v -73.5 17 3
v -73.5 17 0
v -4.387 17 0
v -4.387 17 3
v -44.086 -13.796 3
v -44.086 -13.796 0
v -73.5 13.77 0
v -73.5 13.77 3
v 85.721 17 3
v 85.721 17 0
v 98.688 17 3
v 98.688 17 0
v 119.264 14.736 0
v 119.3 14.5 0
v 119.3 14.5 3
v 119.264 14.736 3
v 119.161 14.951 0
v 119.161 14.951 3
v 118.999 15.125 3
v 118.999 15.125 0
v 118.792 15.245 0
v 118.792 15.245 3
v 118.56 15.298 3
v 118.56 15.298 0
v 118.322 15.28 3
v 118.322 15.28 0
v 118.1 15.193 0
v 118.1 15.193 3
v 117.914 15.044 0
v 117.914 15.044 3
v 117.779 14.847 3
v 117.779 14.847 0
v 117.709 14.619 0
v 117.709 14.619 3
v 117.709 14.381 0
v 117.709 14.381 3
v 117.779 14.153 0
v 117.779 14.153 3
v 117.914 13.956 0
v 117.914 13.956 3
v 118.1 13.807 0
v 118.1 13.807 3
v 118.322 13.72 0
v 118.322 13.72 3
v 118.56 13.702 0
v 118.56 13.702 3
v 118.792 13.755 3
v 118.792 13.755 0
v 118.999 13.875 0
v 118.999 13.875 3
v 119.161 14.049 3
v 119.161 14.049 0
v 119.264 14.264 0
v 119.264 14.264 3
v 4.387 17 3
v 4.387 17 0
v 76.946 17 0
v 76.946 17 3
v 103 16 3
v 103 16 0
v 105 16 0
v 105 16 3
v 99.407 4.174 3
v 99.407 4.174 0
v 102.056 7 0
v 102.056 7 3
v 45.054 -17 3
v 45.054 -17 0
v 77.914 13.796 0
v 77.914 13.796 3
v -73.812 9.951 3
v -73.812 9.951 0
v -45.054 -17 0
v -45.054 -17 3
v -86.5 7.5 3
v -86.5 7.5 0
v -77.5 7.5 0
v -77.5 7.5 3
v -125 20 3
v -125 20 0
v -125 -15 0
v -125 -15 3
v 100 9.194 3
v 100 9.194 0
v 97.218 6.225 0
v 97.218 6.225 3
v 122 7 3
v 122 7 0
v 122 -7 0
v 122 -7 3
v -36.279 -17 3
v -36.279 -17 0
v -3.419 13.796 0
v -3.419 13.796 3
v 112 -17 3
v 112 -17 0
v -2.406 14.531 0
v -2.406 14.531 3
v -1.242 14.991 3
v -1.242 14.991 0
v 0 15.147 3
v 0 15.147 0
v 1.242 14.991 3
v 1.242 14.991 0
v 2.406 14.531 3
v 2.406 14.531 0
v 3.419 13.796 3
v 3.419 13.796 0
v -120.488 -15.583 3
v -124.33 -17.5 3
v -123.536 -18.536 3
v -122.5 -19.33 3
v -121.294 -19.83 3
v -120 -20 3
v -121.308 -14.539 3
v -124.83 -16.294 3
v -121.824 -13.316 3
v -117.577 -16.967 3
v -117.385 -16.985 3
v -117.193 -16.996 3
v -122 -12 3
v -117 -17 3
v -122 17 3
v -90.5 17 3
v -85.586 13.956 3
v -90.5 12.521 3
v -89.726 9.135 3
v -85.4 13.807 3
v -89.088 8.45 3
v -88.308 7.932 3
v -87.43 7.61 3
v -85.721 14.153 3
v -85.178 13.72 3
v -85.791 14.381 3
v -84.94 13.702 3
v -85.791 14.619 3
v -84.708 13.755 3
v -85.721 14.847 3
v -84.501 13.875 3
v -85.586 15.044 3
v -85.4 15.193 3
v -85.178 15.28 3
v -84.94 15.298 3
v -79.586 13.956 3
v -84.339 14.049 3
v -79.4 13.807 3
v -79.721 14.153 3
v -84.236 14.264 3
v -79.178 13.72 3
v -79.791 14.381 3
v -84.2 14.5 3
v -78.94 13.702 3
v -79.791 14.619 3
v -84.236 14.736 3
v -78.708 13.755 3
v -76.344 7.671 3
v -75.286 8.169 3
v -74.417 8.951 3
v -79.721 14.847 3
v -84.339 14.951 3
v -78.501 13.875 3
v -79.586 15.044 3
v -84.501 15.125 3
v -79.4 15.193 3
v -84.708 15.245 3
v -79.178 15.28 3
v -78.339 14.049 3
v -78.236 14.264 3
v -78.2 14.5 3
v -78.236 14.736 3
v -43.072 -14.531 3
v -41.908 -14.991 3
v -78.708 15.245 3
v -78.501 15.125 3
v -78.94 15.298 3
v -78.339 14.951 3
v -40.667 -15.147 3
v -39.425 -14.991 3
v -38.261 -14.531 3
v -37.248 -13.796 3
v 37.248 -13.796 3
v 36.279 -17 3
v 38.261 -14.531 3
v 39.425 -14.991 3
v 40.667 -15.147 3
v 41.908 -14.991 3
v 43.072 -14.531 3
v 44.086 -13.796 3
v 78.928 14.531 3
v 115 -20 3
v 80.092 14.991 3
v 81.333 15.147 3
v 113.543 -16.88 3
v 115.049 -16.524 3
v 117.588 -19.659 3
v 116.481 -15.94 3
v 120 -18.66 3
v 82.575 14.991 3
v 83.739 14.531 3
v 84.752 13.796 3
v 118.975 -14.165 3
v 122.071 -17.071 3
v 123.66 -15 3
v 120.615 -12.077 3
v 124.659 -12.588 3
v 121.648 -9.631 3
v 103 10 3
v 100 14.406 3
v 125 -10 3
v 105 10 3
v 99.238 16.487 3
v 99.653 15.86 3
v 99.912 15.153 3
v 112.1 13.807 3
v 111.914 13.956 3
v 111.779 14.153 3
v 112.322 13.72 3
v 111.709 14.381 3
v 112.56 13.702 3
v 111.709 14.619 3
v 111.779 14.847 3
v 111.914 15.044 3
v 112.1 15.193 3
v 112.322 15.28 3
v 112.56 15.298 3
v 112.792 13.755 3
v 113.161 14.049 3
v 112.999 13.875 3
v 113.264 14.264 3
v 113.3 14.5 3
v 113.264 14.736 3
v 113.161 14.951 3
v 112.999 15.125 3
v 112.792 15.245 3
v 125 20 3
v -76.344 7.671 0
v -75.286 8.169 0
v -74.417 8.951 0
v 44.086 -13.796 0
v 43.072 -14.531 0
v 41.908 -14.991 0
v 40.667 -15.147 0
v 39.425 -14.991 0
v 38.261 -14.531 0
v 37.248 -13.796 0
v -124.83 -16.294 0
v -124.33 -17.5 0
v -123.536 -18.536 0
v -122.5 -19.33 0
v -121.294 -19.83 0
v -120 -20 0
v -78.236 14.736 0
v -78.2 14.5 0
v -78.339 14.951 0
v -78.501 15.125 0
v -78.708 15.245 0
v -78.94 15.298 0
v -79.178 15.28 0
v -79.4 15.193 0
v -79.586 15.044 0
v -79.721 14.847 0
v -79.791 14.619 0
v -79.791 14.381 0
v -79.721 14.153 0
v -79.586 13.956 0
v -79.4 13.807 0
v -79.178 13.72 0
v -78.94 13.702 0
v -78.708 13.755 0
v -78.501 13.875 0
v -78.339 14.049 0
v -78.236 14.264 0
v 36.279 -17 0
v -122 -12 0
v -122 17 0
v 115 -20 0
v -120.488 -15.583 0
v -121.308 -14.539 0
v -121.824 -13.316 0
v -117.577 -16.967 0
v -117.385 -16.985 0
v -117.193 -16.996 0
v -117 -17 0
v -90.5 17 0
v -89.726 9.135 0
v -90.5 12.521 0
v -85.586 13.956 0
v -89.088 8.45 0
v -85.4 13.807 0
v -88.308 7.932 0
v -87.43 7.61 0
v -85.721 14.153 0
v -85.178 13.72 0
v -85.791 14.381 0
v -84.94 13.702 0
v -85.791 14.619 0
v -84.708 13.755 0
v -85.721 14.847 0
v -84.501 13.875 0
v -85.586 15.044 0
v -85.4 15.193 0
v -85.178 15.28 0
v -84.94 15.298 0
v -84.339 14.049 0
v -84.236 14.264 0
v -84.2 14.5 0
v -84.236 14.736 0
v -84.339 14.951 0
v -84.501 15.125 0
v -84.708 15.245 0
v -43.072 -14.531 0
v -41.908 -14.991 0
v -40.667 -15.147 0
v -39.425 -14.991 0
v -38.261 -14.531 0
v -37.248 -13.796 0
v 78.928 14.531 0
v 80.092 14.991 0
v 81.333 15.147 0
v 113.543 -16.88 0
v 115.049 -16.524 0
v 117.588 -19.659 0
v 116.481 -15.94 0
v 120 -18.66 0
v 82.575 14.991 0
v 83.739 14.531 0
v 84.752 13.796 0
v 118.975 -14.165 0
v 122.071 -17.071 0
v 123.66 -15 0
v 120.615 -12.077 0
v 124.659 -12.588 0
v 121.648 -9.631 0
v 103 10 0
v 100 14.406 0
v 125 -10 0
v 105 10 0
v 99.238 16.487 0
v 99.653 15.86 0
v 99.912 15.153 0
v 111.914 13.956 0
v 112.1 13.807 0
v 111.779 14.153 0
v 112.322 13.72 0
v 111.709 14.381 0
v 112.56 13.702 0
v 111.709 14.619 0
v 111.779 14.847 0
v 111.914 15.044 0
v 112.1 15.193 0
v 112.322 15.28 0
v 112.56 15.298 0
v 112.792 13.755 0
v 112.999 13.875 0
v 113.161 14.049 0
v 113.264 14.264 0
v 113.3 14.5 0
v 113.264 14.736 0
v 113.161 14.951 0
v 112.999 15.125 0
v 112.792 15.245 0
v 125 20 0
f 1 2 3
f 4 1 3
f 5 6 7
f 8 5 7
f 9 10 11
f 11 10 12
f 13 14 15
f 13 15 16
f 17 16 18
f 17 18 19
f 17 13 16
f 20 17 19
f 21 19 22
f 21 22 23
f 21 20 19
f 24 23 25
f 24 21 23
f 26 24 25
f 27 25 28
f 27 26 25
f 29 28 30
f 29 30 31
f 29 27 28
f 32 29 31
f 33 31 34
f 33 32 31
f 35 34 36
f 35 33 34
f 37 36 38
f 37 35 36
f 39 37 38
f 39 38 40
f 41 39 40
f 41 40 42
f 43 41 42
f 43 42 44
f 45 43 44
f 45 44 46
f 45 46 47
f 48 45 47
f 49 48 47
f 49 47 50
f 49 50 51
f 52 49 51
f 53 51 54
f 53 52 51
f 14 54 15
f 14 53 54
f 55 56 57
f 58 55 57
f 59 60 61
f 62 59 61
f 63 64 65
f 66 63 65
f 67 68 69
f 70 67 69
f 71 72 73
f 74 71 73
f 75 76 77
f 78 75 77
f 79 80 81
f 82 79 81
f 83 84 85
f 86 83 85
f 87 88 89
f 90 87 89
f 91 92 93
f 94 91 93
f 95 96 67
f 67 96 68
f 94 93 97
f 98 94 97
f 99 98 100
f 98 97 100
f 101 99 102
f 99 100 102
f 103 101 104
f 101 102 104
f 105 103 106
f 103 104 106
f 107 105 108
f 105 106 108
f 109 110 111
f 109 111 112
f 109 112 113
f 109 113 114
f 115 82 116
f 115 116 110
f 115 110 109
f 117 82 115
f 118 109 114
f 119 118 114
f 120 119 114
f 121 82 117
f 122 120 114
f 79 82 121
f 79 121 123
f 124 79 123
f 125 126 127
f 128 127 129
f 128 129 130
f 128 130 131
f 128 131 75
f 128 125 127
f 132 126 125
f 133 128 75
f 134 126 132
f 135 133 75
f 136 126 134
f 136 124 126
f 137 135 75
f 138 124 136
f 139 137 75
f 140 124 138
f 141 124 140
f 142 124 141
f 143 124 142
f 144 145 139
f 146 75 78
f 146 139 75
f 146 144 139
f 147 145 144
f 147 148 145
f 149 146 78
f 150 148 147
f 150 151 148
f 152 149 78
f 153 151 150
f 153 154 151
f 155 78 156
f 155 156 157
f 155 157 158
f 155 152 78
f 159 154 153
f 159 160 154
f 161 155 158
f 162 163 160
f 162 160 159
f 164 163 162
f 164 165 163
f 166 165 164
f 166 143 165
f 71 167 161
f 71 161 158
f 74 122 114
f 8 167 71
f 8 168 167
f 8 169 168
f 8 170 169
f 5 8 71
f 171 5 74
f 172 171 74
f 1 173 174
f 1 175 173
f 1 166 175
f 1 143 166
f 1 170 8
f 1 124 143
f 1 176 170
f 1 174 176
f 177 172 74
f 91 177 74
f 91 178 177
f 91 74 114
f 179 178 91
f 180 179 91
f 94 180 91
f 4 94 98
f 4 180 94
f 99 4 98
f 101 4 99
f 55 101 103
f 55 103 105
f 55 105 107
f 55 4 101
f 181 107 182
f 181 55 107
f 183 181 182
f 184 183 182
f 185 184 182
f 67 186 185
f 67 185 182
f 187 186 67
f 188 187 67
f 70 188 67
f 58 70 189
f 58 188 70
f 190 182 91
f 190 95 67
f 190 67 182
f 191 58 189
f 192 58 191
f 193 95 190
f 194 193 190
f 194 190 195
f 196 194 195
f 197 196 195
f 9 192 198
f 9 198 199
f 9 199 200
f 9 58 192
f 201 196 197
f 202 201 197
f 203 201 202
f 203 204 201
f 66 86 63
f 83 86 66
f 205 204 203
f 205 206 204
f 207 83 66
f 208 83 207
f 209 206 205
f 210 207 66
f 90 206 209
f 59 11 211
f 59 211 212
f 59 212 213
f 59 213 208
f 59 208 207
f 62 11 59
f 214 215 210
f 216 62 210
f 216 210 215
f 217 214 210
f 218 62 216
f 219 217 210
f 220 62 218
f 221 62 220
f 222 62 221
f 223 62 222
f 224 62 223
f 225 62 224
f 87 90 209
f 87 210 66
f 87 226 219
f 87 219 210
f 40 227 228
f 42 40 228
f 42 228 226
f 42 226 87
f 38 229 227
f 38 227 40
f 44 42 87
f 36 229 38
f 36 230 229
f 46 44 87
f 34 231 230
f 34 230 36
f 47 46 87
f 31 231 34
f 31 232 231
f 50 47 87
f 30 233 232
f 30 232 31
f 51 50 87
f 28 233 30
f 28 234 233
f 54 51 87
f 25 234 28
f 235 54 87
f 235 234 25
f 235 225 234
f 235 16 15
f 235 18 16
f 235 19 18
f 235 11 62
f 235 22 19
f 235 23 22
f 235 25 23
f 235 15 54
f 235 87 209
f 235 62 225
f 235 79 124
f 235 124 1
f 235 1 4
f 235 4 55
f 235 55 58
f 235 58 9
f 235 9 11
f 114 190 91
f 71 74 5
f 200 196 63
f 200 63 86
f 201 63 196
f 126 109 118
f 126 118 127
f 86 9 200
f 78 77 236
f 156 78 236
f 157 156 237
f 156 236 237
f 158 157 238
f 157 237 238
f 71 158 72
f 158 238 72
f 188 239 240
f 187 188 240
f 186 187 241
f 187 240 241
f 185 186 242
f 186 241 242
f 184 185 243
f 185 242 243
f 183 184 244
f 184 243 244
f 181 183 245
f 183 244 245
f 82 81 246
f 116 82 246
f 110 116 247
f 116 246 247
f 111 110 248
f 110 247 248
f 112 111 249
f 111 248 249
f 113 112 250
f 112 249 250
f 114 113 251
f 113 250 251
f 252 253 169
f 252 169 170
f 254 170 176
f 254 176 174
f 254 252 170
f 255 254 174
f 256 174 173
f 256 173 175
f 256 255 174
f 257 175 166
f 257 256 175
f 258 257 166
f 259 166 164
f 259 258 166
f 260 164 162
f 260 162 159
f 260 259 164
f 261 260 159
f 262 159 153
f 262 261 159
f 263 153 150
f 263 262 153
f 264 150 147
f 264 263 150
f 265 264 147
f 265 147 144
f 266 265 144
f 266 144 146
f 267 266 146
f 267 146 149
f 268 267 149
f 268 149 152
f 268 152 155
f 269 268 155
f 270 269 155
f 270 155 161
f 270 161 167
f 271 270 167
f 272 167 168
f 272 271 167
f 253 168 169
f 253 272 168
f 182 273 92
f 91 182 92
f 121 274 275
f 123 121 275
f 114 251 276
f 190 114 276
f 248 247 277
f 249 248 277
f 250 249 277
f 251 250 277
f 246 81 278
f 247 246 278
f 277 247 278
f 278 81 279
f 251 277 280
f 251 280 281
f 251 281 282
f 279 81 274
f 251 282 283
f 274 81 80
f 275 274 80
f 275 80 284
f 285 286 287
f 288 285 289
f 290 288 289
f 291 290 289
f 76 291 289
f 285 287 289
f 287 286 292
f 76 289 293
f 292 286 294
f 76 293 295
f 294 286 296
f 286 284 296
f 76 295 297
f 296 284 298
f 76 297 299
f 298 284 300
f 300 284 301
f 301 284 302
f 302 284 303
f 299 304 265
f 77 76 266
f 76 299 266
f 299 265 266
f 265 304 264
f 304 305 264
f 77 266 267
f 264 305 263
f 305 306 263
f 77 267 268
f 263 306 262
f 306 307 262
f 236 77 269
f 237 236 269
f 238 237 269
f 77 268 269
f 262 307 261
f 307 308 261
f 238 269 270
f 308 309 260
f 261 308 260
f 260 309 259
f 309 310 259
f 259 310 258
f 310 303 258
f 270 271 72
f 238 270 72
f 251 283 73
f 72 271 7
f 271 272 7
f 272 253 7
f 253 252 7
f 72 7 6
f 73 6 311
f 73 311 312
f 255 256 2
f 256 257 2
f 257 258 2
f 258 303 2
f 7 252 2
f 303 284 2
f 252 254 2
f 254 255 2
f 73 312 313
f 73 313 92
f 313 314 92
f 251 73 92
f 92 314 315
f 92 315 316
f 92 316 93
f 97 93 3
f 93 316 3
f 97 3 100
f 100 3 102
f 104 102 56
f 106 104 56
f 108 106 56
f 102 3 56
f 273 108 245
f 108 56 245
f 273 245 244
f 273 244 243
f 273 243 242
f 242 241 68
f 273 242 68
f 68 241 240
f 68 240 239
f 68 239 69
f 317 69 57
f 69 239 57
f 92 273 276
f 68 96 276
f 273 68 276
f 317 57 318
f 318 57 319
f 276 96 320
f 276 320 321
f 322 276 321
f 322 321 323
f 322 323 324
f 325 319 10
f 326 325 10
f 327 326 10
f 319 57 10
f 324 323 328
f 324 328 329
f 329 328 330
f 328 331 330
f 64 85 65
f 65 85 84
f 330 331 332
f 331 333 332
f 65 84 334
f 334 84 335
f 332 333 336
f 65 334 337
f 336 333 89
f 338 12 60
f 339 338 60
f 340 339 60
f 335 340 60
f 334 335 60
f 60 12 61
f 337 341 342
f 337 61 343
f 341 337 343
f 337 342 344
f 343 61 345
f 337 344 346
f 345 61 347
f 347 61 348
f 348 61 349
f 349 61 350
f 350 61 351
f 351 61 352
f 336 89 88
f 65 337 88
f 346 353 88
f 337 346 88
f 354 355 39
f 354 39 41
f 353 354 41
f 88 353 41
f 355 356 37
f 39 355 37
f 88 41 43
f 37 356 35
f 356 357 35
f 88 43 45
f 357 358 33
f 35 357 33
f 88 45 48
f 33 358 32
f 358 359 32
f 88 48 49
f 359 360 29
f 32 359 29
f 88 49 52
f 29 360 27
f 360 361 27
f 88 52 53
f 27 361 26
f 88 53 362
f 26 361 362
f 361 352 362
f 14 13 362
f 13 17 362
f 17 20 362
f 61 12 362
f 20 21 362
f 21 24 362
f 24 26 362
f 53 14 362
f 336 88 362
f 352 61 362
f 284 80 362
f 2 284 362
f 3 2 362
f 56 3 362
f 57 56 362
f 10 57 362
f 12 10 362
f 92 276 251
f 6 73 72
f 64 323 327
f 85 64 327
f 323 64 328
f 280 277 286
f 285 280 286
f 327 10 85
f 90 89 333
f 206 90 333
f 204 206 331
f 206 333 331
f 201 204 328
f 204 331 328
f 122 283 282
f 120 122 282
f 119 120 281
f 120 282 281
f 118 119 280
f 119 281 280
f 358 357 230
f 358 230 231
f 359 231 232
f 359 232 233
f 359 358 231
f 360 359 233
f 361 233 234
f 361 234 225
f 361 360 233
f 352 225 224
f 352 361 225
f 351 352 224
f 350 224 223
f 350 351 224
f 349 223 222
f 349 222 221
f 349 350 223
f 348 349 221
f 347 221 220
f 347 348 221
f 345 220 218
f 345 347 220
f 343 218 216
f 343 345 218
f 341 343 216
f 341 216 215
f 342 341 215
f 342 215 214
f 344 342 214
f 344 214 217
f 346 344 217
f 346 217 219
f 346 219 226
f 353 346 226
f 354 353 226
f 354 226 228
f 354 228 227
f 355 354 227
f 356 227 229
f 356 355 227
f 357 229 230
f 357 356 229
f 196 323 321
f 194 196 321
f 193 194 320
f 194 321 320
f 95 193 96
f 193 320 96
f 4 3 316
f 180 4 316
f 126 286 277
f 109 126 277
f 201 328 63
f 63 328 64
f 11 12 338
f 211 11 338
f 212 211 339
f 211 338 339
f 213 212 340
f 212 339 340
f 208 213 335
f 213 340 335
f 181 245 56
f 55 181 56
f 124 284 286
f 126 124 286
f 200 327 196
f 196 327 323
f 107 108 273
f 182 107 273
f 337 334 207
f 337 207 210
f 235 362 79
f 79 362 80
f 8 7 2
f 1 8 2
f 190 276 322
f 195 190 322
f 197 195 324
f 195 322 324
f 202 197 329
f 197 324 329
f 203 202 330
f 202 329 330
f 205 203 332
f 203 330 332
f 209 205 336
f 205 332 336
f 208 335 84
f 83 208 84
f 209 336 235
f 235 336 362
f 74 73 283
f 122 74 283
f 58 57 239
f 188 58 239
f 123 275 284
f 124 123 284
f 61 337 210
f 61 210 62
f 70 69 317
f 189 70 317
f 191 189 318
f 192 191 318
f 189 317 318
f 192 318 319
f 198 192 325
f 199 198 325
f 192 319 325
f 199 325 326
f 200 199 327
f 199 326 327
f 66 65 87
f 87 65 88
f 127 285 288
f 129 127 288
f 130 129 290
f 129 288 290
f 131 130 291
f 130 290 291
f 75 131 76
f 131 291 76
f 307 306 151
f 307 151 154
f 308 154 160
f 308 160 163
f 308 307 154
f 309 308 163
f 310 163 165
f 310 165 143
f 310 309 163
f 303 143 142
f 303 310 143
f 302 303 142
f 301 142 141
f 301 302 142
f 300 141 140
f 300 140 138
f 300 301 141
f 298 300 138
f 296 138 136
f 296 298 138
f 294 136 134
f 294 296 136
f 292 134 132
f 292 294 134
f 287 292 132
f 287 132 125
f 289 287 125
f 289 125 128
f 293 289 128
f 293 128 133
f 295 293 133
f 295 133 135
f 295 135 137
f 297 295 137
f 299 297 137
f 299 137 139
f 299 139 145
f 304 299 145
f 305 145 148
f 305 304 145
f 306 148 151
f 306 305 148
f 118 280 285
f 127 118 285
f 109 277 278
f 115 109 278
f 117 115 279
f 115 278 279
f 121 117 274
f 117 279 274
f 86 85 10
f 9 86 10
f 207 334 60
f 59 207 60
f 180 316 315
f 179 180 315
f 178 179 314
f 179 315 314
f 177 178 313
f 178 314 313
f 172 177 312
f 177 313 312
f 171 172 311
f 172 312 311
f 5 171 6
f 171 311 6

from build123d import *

# Parameters (mm, degrees)
SKETCH_1_R      = 0.8
SKETCH_1_W      = 2
SKETCH_1_H      = 6
EXTRUDE_1_DEPTH = 3


with BuildPart() as part:
    # 草图1 → 凸台-拉伸1 (new body)
    with BuildSketch(Plane.XY):
        with BuildLine():
            Line((125, 20), (-125, 20))
            Line((-125, 20), (-125, -15))
            ThreePointArc((-125, -15), (-123.535533906, -18.535533906), (-120, -20))
            Line((-120, -20), (115, -20))
            ThreePointArc((115, -20), (122.071067812, -17.071067812), (125, -10))
            Line((125, -10), (125, 20))
        make_face()
        with BuildLine():
            Line((-117.577166779, -16.966576135), (-89.725823654, 9.134823104))
            ThreePointArc((-89.725823654, 9.134823104), (-88.308216305, 7.932037866), (-86.5, 7.5))
            Line((-86.5, 7.5), (-77.5, 7.5))
            ThreePointArc((-77.5, 7.5), (-75.2858442, 8.168706844), (-73.811998968, 9.951242954))
            Line((-73.811998968, 9.951242954), (-45.053835151, -17))
            Line((-45.053835151, -17), (-117, -17))
            ThreePointArc((-117, -17), (-117.28906688, -16.99163704), (-117.577166779, -16.966576135))
        make_face(mode=Mode.SUBTRACT)
        with BuildLine():
            Line((36.279498182, -17), (-36.279498182, -17))
            Line((-36.279498182, -17), (-3.41906176, 13.795763292))
            ThreePointArc((-3.41906176, 13.795763292), (0, 15.147473736), (3.41906176, 13.795763292))
            Line((3.41906176, 13.795763292), (36.279498182, -17))
        make_face(mode=Mode.SUBTRACT)
        with BuildLine():
            Line((112, -17), (45.053835151, -17))
            Line((45.053835151, -17), (77.914271574, 13.795763292))
            ThreePointArc((77.914271574, 13.795763292), (81.333333333, 15.147473736), (84.752395093, 13.795763292))
            Line((84.752395093, 13.795763292), (116.481383158, -15.93964233))
            ThreePointArc((116.481383158, -15.93964233), (114.302561258, -16.731300615), (112, -17))
        make_face(mode=Mode.SUBTRACT)
        with BuildLine():
            Line((-90.5, 12.520805239), (-120.487704725, -15.582724626))
            ThreePointArc((-120.487704725, -15.582724626), (-121.606436998, -13.944412041), (-122, -12))
            Line((-122, -12), (-122, 17))
            Line((-122, 17), (-90.5, 17))
            Line((-90.5, 17), (-90.5, 12.520805239))
        make_face(mode=Mode.SUBTRACT)
        with BuildLine():
            Line((-73.5, 17), (-4.387168485, 17))
            Line((-4.387168485, 17), (-37.247604907, -13.795763292))
            ThreePointArc((-37.247604907, -13.795763292), (-40.666666667, -15.147473736), (-44.085728426, -13.795763292))
            Line((-44.085728426, -13.795763292), (-73.5, 13.770363133))
            Line((-73.5, 13.770363133), (-73.5, 17))
        make_face(mode=Mode.SUBTRACT)
        with Locations((-85, 14.5)):
            Circle(SKETCH_1_R, mode=Mode.SUBTRACT)
        with Locations((-79, 14.5)):
            Circle(SKETCH_1_R, mode=Mode.SUBTRACT)
        with BuildLine():
            Line((4.387168485, 17), (76.946164849, 17))
            Line((76.946164849, 17), (44.085728426, -13.795763292))
            ThreePointArc((44.085728426, -13.795763292), (40.666666667, -15.147473736), (37.247604907, -13.795763292))
            Line((37.247604907, -13.795763292), (4.387168485, 17))
        make_face(mode=Mode.SUBTRACT)
        with BuildLine():
            ThreePointArc((122, -7), (121.212873995, -10.888824083), (118.975409451, -14.165449253))
            Line((118.975409451, -14.165449253), (99.406893969, 4.173545488))
            Line((99.406893969, 4.173545488), (102.055757879, 7))
            Line((102.055757879, 7), (122, 7))
            Line((122, 7), (122, -7))
        make_face(mode=Mode.SUBTRACT)
        with BuildLine():
            Line((100, 9.193584242), (97.217920236, 6.224982544))
            Line((97.217920236, 6.224982544), (85.720501818, 17))
            Line((85.720501818, 17), (98.687816207, 17))
            ThreePointArc((98.687816207, 17), (99.653283041, 15.859737408), (100, 14.406426589))
            Line((100, 14.406426589), (100, 9.193584242))
        make_face(mode=Mode.SUBTRACT)
        with Locations((104, 13)):
            Rectangle(SKETCH_1_W, SKETCH_1_H, mode=Mode.SUBTRACT)
        with Locations((118.5, 14.5)):
            Circle(SKETCH_1_R, mode=Mode.SUBTRACT)
        with Locations((112.5, 14.5)):
            Circle(SKETCH_1_R, mode=Mode.SUBTRACT)
    extrude(amount=EXTRUDE_1_DEPTH)


solid = part.part
